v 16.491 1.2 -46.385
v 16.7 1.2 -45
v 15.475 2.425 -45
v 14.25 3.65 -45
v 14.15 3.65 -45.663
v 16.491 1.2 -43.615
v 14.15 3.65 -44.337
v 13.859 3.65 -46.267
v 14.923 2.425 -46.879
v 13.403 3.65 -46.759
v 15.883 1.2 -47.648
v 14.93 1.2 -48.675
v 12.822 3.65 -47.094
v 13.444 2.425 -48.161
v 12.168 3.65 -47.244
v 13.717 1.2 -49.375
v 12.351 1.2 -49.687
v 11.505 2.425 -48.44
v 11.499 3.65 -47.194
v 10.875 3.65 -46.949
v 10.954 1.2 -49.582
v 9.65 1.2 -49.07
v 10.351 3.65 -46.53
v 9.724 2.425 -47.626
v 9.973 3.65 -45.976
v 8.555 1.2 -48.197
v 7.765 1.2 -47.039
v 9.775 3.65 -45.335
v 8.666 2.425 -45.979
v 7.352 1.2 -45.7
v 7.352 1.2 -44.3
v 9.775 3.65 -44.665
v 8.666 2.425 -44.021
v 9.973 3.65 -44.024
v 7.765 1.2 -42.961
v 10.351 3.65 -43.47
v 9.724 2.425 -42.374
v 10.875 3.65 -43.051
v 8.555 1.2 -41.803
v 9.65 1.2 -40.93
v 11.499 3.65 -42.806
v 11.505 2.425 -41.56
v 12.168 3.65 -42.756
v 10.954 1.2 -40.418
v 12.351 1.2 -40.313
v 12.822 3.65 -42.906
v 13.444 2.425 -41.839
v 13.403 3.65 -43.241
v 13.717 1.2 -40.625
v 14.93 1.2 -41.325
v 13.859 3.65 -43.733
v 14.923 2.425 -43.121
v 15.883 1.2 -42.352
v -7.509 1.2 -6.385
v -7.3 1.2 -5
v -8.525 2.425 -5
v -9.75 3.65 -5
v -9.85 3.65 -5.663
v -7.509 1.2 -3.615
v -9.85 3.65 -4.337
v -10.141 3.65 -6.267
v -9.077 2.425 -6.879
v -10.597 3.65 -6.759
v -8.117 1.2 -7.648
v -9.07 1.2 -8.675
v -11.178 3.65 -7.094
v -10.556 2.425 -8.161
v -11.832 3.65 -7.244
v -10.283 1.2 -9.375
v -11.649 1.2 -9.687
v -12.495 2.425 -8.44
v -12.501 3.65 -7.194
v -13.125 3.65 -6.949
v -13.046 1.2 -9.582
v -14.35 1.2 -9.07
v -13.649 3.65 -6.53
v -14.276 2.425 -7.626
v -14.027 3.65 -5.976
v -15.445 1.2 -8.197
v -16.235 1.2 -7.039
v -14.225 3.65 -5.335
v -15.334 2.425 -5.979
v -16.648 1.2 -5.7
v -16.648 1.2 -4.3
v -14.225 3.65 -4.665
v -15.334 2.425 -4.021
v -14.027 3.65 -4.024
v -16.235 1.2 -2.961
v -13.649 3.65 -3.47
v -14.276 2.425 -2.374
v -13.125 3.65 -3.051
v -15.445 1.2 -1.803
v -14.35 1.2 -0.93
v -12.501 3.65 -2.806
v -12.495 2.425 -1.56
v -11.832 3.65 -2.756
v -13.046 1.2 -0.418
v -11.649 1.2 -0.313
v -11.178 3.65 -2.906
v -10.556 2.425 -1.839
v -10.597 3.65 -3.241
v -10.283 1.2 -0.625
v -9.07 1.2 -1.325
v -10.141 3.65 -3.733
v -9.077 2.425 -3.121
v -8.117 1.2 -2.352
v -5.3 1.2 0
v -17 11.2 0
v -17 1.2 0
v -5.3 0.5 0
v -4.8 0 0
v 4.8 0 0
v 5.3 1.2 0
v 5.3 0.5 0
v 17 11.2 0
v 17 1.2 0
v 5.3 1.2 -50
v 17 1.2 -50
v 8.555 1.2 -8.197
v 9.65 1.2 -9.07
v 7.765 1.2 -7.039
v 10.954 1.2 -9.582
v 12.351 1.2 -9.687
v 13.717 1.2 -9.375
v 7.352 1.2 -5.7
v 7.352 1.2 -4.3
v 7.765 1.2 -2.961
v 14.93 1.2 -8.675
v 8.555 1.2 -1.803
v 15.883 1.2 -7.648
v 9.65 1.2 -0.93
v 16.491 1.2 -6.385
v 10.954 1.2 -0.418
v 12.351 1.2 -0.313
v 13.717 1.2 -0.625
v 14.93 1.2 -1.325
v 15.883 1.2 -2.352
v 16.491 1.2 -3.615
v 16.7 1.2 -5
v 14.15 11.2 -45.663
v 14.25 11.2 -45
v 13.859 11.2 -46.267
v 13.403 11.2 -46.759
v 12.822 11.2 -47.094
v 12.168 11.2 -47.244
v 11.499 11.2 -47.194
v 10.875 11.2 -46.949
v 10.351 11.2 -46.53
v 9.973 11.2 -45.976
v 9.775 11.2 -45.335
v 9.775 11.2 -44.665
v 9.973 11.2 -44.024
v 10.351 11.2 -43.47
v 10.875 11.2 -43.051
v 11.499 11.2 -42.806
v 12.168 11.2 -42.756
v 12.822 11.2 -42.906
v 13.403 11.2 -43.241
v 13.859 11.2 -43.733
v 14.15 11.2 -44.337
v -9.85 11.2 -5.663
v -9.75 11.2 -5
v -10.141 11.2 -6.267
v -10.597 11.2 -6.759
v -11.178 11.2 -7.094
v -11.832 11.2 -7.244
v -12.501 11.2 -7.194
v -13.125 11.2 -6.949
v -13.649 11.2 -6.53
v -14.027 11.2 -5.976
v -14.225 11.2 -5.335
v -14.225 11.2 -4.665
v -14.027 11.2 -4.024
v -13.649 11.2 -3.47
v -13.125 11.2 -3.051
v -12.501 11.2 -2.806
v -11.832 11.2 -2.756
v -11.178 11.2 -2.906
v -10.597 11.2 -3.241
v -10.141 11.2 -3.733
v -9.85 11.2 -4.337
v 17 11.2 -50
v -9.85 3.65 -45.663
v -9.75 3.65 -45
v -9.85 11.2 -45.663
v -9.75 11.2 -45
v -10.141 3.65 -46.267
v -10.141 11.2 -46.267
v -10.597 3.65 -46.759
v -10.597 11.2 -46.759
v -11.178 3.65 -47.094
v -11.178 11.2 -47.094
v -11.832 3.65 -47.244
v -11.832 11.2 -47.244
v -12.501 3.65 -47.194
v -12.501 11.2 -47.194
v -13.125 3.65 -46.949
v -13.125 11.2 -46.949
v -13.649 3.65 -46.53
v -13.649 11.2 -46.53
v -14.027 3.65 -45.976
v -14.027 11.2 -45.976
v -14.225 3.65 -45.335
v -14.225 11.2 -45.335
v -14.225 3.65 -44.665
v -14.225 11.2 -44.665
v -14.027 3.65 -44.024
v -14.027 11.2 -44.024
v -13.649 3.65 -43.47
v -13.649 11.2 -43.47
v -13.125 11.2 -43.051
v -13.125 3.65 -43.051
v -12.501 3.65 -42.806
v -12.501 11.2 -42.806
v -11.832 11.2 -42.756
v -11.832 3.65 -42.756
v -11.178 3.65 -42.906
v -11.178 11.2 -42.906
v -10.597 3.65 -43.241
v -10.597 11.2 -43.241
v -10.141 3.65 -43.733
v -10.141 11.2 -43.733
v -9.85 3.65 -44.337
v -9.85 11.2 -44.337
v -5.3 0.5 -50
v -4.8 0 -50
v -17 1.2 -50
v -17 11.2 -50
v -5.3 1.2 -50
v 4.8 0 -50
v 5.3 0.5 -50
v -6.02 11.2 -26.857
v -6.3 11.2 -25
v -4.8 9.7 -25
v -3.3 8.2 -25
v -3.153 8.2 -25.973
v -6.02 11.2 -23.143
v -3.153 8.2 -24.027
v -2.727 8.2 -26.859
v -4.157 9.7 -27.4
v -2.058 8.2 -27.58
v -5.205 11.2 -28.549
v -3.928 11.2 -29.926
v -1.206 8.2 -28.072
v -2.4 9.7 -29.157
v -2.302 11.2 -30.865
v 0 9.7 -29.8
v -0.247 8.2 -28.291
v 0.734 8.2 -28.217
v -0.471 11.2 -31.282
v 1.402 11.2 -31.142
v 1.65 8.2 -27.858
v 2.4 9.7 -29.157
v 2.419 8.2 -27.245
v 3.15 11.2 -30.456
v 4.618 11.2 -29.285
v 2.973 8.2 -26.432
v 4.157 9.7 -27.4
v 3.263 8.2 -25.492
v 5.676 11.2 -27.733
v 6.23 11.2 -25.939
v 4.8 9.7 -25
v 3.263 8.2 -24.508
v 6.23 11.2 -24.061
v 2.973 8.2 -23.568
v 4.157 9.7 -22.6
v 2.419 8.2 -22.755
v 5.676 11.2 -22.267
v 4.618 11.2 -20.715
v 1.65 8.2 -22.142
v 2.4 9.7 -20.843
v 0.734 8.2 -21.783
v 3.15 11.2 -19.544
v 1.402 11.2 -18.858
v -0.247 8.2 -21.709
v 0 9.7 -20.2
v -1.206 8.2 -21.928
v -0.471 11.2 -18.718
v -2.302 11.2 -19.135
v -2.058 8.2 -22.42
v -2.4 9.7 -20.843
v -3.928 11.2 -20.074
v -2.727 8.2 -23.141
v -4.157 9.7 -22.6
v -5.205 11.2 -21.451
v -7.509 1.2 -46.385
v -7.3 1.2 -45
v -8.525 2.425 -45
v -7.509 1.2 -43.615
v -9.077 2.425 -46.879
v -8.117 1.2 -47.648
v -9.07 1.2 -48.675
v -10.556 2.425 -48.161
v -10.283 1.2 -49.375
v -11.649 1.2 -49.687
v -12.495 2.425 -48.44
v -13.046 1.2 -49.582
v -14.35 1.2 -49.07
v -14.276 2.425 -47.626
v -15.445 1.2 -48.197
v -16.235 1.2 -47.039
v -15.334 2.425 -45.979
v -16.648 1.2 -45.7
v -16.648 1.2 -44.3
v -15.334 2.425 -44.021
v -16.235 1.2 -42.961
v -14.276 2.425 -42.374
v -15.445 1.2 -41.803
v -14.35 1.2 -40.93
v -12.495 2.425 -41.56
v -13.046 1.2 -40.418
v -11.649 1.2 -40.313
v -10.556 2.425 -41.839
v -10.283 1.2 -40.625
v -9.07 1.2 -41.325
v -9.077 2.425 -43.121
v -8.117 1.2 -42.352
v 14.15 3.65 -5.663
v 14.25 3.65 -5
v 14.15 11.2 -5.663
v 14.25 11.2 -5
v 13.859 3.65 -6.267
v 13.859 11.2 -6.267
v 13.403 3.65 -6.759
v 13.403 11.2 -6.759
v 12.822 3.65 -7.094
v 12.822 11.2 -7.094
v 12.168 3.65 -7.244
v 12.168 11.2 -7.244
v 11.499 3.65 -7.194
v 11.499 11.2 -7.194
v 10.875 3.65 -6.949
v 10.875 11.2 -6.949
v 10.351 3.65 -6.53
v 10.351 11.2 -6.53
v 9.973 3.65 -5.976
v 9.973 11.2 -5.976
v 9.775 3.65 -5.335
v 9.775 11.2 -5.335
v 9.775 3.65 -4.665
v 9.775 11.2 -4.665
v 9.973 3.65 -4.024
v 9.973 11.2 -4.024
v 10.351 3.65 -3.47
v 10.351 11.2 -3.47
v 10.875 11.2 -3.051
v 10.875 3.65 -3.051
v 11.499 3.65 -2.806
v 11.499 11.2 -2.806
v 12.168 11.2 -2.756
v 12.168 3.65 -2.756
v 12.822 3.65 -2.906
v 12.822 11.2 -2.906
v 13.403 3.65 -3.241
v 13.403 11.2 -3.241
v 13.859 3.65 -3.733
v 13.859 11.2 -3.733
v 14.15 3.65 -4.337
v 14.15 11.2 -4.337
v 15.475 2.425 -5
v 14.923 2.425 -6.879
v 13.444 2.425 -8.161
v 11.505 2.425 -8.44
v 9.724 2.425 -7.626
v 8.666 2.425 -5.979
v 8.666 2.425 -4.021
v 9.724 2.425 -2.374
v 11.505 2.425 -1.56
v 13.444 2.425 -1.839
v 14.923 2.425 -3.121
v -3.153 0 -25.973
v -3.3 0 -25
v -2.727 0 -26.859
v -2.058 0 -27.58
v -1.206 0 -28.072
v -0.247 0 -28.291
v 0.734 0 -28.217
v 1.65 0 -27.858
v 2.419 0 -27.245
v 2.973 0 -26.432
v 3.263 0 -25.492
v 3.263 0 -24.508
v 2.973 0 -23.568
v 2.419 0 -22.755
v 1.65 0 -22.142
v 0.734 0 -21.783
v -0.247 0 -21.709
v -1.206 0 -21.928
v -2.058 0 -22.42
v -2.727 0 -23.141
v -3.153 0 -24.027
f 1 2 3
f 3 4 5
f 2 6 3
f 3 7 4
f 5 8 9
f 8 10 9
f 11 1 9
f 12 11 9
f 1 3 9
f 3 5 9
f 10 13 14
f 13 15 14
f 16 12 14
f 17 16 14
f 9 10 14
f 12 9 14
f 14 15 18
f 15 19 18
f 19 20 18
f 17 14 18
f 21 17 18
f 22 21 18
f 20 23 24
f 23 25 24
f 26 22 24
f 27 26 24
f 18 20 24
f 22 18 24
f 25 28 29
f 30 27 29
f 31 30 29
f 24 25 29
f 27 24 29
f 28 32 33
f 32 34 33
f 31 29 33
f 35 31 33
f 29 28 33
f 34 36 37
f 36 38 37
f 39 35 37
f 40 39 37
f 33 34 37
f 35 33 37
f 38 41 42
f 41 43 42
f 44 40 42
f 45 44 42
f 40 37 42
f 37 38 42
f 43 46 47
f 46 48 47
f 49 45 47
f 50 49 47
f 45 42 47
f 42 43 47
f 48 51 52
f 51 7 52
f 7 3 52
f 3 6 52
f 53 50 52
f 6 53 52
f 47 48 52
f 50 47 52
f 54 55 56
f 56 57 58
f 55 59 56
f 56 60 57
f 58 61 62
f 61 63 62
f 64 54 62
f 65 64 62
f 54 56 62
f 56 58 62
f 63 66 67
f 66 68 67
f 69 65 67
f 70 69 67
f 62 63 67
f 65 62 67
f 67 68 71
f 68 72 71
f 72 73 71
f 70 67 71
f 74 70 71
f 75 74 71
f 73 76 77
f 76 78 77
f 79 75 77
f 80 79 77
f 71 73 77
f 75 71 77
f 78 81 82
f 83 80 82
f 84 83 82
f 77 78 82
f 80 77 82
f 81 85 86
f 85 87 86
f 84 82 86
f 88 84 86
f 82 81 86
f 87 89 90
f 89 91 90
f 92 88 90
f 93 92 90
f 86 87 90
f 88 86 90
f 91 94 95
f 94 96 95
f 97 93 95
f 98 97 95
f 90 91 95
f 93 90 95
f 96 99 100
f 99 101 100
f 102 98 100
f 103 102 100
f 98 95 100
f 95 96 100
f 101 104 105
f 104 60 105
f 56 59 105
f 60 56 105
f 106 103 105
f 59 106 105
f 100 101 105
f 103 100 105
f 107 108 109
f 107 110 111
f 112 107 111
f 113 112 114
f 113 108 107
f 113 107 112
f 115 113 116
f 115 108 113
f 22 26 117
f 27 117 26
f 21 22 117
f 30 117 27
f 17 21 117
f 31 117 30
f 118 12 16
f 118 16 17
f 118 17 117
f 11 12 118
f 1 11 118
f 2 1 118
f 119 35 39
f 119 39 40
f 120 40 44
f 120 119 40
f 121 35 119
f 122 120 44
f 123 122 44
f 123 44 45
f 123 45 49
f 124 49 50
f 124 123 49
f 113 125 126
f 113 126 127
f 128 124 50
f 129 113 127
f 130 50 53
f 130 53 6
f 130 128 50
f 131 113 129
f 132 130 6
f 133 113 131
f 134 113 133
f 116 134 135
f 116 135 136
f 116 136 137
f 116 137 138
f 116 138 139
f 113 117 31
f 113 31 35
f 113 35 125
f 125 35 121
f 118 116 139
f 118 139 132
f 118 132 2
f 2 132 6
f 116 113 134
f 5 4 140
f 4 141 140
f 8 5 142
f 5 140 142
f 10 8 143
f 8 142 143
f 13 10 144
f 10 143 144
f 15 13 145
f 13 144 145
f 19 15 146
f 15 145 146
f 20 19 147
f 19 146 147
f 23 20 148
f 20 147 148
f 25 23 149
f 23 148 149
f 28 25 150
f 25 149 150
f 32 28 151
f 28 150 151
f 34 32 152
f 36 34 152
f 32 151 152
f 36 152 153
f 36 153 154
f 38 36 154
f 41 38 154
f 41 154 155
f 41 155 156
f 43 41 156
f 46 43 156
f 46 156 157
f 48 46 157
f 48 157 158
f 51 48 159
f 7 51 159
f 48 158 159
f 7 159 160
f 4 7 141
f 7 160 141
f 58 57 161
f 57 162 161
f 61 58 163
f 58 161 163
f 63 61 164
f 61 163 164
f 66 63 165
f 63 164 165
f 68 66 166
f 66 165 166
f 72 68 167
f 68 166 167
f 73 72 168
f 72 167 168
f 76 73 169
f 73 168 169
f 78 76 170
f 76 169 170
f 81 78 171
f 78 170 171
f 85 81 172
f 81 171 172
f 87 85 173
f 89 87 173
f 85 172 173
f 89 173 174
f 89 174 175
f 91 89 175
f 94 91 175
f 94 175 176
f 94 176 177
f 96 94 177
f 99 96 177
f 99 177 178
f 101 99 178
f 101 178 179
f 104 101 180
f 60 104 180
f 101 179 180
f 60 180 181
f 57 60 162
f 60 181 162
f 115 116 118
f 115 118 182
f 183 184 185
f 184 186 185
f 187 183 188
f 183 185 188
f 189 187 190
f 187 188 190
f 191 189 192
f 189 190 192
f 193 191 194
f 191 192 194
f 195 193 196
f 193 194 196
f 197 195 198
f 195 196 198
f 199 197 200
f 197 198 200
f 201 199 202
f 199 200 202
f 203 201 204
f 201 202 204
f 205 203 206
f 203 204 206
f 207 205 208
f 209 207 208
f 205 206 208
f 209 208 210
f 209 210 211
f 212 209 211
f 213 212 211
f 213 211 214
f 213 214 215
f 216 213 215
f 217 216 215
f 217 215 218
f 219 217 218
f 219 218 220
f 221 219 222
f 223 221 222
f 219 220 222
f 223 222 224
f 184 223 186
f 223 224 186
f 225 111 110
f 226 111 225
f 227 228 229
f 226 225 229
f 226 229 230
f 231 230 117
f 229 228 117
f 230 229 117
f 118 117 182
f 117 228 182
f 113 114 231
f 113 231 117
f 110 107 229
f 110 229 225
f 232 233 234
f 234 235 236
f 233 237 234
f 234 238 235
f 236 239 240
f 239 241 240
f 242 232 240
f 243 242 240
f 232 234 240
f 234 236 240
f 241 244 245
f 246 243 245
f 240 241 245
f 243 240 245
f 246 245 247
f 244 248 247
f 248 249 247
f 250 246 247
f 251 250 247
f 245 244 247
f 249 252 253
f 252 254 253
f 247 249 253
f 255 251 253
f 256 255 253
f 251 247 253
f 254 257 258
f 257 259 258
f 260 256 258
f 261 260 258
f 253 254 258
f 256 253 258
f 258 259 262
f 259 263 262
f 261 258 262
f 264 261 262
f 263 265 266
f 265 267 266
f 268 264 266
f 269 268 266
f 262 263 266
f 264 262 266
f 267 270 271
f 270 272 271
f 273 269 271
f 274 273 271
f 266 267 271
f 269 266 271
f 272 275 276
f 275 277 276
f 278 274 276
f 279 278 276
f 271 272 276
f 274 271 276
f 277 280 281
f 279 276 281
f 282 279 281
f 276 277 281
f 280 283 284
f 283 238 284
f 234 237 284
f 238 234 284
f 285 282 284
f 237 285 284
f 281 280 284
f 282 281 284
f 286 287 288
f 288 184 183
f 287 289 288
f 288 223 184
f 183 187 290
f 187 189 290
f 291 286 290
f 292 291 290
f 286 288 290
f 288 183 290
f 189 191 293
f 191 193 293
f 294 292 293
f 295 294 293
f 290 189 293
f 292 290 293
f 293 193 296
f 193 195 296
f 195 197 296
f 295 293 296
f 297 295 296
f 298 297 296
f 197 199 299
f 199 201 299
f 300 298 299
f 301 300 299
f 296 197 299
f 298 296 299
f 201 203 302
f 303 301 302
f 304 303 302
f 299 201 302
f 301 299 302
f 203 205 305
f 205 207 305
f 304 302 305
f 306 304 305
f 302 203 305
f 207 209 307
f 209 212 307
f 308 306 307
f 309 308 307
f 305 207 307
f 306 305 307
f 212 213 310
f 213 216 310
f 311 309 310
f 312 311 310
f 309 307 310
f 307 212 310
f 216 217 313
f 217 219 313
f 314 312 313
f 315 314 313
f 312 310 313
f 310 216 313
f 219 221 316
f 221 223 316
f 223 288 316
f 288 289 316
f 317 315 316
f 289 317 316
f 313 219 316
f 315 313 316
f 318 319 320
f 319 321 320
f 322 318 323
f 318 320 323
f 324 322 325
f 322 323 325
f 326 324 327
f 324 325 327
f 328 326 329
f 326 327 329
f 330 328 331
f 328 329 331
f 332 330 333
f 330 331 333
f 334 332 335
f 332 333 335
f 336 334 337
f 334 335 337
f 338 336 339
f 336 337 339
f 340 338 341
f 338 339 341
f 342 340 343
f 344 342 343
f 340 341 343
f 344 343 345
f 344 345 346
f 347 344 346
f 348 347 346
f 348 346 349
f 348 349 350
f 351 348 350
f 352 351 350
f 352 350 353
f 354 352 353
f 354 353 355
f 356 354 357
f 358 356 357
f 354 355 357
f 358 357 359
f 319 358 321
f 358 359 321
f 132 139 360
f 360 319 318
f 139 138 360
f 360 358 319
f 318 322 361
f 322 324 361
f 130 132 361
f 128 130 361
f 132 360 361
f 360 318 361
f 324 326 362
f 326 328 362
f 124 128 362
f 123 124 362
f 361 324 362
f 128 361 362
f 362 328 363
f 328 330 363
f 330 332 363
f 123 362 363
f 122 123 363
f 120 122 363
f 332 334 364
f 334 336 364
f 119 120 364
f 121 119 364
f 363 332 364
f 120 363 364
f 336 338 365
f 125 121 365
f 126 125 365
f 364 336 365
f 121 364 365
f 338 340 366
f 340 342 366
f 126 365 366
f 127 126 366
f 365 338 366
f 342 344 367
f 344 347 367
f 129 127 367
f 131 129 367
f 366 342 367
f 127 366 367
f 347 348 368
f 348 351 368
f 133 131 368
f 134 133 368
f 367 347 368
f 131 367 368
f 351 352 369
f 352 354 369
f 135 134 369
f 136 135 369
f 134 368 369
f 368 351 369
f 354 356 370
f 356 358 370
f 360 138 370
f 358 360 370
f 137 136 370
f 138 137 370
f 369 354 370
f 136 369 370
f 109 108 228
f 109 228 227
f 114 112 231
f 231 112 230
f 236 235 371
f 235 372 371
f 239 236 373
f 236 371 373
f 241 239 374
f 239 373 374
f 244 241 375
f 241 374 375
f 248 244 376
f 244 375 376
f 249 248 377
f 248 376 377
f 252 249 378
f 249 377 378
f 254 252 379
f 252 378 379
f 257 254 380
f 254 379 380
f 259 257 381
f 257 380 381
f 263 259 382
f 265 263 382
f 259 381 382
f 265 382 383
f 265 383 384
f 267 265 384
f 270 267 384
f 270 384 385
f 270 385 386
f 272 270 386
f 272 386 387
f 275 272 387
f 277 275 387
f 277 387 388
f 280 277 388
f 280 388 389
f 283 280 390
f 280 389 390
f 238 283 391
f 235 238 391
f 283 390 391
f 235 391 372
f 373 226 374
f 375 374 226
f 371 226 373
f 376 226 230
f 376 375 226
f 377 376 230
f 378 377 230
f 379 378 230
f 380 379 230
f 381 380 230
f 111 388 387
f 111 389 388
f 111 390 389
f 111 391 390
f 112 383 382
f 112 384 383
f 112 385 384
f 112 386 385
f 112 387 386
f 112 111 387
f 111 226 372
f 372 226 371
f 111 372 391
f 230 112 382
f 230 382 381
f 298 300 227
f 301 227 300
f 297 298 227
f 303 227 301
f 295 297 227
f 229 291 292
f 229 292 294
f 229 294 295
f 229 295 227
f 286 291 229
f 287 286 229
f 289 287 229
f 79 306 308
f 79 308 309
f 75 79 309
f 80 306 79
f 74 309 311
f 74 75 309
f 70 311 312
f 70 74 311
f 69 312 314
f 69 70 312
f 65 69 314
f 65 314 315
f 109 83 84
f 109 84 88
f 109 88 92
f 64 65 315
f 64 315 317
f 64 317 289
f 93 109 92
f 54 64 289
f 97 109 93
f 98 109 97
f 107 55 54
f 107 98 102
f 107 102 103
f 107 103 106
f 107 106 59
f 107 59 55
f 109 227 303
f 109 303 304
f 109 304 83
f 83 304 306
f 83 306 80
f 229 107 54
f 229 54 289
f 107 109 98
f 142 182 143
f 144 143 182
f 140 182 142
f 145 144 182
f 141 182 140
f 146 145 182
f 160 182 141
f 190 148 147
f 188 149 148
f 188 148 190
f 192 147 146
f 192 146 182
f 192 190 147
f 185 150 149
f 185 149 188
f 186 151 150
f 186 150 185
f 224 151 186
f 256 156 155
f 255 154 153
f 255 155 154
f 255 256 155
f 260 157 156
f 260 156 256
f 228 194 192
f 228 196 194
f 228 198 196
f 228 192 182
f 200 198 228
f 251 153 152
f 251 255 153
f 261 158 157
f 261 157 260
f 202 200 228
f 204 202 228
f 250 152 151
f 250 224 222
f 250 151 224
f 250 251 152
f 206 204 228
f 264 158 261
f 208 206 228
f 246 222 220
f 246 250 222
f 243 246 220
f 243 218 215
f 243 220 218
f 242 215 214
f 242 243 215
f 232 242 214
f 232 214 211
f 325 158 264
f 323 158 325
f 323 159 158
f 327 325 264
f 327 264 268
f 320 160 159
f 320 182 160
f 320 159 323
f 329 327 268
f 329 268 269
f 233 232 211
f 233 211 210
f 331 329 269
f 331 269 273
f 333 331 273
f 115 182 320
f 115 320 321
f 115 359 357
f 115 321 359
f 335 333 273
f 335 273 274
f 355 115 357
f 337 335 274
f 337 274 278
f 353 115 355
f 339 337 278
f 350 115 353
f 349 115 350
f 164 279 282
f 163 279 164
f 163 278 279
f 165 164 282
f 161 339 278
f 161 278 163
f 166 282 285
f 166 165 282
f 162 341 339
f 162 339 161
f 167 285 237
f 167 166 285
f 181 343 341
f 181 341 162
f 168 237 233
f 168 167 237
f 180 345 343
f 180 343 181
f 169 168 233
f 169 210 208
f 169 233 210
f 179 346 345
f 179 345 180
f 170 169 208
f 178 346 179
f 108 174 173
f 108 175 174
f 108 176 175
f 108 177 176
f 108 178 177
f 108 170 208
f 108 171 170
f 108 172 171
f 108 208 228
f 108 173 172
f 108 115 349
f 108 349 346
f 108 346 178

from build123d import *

# Parameters (mm, degrees)
EXTRUDE_1_DEPTH            = 50
HOLE_WIZARD_M6_D           = 6.6
HOLE_WIZARD_M6_CSINK_D     = 12.6
HOLE_WIZARD_M6_CSINK_ANGLE = 90
HOLE_WIZARD_M4_D           = 4.5
HOLE_WIZARD_M4_CSINK_D     = 9.4
HOLE_WIZARD_M4_CSINK_ANGLE = 90
CHAMFER_1_SIZE             = 0.5


with BuildPart() as part:
    # Эскиз1 → Бобышка-Вытянуть1 (new body)
    with BuildSketch(Plane.XY):
        Polygon((0, 0), (5.3, 0), (5.3, 1.2), (17, 1.2), (17, 11.2), (-17, 11.2), (-17, 1.2), (-5.3, 1.2), (-5.3, 0), align=None)
    extrude(amount=-EXTRUDE_1_DEPTH)

    # Винт M6 (through all)
    with Locations(Plane(origin=(0, 11.2, 0), x_dir=(1, 0, 0), z_dir=(0, 1, 0))):
        with Locations((0, 25)):
            CounterSinkHole(HOLE_WIZARD_M6_D / 2, HOLE_WIZARD_M6_CSINK_D / 2, counter_sink_angle=HOLE_WIZARD_M6_CSINK_ANGLE)

    # Винт M4 (through all)
    with Locations(Plane(origin=(0, 1.2, 0), x_dir=(-1, 0, 0), z_dir=(0, -1, 0))):
        with Locations((12, 5), (-12, 5), (12, 45), (-12, 45)):
            CounterSinkHole(HOLE_WIZARD_M4_D / 2, HOLE_WIZARD_M4_CSINK_D / 2, counter_sink_angle=HOLE_WIZARD_M4_CSINK_ANGLE)

    # Фаска1
    chamfer_1_edges = [part.edges().sort_by_distance(p)[0] for p in [
        (-5.3, 0, -25),
        (5.3, 0, -25),
    ]]
    chamfer(chamfer_1_edges, length=CHAMFER_1_SIZE)


solid = part.part
